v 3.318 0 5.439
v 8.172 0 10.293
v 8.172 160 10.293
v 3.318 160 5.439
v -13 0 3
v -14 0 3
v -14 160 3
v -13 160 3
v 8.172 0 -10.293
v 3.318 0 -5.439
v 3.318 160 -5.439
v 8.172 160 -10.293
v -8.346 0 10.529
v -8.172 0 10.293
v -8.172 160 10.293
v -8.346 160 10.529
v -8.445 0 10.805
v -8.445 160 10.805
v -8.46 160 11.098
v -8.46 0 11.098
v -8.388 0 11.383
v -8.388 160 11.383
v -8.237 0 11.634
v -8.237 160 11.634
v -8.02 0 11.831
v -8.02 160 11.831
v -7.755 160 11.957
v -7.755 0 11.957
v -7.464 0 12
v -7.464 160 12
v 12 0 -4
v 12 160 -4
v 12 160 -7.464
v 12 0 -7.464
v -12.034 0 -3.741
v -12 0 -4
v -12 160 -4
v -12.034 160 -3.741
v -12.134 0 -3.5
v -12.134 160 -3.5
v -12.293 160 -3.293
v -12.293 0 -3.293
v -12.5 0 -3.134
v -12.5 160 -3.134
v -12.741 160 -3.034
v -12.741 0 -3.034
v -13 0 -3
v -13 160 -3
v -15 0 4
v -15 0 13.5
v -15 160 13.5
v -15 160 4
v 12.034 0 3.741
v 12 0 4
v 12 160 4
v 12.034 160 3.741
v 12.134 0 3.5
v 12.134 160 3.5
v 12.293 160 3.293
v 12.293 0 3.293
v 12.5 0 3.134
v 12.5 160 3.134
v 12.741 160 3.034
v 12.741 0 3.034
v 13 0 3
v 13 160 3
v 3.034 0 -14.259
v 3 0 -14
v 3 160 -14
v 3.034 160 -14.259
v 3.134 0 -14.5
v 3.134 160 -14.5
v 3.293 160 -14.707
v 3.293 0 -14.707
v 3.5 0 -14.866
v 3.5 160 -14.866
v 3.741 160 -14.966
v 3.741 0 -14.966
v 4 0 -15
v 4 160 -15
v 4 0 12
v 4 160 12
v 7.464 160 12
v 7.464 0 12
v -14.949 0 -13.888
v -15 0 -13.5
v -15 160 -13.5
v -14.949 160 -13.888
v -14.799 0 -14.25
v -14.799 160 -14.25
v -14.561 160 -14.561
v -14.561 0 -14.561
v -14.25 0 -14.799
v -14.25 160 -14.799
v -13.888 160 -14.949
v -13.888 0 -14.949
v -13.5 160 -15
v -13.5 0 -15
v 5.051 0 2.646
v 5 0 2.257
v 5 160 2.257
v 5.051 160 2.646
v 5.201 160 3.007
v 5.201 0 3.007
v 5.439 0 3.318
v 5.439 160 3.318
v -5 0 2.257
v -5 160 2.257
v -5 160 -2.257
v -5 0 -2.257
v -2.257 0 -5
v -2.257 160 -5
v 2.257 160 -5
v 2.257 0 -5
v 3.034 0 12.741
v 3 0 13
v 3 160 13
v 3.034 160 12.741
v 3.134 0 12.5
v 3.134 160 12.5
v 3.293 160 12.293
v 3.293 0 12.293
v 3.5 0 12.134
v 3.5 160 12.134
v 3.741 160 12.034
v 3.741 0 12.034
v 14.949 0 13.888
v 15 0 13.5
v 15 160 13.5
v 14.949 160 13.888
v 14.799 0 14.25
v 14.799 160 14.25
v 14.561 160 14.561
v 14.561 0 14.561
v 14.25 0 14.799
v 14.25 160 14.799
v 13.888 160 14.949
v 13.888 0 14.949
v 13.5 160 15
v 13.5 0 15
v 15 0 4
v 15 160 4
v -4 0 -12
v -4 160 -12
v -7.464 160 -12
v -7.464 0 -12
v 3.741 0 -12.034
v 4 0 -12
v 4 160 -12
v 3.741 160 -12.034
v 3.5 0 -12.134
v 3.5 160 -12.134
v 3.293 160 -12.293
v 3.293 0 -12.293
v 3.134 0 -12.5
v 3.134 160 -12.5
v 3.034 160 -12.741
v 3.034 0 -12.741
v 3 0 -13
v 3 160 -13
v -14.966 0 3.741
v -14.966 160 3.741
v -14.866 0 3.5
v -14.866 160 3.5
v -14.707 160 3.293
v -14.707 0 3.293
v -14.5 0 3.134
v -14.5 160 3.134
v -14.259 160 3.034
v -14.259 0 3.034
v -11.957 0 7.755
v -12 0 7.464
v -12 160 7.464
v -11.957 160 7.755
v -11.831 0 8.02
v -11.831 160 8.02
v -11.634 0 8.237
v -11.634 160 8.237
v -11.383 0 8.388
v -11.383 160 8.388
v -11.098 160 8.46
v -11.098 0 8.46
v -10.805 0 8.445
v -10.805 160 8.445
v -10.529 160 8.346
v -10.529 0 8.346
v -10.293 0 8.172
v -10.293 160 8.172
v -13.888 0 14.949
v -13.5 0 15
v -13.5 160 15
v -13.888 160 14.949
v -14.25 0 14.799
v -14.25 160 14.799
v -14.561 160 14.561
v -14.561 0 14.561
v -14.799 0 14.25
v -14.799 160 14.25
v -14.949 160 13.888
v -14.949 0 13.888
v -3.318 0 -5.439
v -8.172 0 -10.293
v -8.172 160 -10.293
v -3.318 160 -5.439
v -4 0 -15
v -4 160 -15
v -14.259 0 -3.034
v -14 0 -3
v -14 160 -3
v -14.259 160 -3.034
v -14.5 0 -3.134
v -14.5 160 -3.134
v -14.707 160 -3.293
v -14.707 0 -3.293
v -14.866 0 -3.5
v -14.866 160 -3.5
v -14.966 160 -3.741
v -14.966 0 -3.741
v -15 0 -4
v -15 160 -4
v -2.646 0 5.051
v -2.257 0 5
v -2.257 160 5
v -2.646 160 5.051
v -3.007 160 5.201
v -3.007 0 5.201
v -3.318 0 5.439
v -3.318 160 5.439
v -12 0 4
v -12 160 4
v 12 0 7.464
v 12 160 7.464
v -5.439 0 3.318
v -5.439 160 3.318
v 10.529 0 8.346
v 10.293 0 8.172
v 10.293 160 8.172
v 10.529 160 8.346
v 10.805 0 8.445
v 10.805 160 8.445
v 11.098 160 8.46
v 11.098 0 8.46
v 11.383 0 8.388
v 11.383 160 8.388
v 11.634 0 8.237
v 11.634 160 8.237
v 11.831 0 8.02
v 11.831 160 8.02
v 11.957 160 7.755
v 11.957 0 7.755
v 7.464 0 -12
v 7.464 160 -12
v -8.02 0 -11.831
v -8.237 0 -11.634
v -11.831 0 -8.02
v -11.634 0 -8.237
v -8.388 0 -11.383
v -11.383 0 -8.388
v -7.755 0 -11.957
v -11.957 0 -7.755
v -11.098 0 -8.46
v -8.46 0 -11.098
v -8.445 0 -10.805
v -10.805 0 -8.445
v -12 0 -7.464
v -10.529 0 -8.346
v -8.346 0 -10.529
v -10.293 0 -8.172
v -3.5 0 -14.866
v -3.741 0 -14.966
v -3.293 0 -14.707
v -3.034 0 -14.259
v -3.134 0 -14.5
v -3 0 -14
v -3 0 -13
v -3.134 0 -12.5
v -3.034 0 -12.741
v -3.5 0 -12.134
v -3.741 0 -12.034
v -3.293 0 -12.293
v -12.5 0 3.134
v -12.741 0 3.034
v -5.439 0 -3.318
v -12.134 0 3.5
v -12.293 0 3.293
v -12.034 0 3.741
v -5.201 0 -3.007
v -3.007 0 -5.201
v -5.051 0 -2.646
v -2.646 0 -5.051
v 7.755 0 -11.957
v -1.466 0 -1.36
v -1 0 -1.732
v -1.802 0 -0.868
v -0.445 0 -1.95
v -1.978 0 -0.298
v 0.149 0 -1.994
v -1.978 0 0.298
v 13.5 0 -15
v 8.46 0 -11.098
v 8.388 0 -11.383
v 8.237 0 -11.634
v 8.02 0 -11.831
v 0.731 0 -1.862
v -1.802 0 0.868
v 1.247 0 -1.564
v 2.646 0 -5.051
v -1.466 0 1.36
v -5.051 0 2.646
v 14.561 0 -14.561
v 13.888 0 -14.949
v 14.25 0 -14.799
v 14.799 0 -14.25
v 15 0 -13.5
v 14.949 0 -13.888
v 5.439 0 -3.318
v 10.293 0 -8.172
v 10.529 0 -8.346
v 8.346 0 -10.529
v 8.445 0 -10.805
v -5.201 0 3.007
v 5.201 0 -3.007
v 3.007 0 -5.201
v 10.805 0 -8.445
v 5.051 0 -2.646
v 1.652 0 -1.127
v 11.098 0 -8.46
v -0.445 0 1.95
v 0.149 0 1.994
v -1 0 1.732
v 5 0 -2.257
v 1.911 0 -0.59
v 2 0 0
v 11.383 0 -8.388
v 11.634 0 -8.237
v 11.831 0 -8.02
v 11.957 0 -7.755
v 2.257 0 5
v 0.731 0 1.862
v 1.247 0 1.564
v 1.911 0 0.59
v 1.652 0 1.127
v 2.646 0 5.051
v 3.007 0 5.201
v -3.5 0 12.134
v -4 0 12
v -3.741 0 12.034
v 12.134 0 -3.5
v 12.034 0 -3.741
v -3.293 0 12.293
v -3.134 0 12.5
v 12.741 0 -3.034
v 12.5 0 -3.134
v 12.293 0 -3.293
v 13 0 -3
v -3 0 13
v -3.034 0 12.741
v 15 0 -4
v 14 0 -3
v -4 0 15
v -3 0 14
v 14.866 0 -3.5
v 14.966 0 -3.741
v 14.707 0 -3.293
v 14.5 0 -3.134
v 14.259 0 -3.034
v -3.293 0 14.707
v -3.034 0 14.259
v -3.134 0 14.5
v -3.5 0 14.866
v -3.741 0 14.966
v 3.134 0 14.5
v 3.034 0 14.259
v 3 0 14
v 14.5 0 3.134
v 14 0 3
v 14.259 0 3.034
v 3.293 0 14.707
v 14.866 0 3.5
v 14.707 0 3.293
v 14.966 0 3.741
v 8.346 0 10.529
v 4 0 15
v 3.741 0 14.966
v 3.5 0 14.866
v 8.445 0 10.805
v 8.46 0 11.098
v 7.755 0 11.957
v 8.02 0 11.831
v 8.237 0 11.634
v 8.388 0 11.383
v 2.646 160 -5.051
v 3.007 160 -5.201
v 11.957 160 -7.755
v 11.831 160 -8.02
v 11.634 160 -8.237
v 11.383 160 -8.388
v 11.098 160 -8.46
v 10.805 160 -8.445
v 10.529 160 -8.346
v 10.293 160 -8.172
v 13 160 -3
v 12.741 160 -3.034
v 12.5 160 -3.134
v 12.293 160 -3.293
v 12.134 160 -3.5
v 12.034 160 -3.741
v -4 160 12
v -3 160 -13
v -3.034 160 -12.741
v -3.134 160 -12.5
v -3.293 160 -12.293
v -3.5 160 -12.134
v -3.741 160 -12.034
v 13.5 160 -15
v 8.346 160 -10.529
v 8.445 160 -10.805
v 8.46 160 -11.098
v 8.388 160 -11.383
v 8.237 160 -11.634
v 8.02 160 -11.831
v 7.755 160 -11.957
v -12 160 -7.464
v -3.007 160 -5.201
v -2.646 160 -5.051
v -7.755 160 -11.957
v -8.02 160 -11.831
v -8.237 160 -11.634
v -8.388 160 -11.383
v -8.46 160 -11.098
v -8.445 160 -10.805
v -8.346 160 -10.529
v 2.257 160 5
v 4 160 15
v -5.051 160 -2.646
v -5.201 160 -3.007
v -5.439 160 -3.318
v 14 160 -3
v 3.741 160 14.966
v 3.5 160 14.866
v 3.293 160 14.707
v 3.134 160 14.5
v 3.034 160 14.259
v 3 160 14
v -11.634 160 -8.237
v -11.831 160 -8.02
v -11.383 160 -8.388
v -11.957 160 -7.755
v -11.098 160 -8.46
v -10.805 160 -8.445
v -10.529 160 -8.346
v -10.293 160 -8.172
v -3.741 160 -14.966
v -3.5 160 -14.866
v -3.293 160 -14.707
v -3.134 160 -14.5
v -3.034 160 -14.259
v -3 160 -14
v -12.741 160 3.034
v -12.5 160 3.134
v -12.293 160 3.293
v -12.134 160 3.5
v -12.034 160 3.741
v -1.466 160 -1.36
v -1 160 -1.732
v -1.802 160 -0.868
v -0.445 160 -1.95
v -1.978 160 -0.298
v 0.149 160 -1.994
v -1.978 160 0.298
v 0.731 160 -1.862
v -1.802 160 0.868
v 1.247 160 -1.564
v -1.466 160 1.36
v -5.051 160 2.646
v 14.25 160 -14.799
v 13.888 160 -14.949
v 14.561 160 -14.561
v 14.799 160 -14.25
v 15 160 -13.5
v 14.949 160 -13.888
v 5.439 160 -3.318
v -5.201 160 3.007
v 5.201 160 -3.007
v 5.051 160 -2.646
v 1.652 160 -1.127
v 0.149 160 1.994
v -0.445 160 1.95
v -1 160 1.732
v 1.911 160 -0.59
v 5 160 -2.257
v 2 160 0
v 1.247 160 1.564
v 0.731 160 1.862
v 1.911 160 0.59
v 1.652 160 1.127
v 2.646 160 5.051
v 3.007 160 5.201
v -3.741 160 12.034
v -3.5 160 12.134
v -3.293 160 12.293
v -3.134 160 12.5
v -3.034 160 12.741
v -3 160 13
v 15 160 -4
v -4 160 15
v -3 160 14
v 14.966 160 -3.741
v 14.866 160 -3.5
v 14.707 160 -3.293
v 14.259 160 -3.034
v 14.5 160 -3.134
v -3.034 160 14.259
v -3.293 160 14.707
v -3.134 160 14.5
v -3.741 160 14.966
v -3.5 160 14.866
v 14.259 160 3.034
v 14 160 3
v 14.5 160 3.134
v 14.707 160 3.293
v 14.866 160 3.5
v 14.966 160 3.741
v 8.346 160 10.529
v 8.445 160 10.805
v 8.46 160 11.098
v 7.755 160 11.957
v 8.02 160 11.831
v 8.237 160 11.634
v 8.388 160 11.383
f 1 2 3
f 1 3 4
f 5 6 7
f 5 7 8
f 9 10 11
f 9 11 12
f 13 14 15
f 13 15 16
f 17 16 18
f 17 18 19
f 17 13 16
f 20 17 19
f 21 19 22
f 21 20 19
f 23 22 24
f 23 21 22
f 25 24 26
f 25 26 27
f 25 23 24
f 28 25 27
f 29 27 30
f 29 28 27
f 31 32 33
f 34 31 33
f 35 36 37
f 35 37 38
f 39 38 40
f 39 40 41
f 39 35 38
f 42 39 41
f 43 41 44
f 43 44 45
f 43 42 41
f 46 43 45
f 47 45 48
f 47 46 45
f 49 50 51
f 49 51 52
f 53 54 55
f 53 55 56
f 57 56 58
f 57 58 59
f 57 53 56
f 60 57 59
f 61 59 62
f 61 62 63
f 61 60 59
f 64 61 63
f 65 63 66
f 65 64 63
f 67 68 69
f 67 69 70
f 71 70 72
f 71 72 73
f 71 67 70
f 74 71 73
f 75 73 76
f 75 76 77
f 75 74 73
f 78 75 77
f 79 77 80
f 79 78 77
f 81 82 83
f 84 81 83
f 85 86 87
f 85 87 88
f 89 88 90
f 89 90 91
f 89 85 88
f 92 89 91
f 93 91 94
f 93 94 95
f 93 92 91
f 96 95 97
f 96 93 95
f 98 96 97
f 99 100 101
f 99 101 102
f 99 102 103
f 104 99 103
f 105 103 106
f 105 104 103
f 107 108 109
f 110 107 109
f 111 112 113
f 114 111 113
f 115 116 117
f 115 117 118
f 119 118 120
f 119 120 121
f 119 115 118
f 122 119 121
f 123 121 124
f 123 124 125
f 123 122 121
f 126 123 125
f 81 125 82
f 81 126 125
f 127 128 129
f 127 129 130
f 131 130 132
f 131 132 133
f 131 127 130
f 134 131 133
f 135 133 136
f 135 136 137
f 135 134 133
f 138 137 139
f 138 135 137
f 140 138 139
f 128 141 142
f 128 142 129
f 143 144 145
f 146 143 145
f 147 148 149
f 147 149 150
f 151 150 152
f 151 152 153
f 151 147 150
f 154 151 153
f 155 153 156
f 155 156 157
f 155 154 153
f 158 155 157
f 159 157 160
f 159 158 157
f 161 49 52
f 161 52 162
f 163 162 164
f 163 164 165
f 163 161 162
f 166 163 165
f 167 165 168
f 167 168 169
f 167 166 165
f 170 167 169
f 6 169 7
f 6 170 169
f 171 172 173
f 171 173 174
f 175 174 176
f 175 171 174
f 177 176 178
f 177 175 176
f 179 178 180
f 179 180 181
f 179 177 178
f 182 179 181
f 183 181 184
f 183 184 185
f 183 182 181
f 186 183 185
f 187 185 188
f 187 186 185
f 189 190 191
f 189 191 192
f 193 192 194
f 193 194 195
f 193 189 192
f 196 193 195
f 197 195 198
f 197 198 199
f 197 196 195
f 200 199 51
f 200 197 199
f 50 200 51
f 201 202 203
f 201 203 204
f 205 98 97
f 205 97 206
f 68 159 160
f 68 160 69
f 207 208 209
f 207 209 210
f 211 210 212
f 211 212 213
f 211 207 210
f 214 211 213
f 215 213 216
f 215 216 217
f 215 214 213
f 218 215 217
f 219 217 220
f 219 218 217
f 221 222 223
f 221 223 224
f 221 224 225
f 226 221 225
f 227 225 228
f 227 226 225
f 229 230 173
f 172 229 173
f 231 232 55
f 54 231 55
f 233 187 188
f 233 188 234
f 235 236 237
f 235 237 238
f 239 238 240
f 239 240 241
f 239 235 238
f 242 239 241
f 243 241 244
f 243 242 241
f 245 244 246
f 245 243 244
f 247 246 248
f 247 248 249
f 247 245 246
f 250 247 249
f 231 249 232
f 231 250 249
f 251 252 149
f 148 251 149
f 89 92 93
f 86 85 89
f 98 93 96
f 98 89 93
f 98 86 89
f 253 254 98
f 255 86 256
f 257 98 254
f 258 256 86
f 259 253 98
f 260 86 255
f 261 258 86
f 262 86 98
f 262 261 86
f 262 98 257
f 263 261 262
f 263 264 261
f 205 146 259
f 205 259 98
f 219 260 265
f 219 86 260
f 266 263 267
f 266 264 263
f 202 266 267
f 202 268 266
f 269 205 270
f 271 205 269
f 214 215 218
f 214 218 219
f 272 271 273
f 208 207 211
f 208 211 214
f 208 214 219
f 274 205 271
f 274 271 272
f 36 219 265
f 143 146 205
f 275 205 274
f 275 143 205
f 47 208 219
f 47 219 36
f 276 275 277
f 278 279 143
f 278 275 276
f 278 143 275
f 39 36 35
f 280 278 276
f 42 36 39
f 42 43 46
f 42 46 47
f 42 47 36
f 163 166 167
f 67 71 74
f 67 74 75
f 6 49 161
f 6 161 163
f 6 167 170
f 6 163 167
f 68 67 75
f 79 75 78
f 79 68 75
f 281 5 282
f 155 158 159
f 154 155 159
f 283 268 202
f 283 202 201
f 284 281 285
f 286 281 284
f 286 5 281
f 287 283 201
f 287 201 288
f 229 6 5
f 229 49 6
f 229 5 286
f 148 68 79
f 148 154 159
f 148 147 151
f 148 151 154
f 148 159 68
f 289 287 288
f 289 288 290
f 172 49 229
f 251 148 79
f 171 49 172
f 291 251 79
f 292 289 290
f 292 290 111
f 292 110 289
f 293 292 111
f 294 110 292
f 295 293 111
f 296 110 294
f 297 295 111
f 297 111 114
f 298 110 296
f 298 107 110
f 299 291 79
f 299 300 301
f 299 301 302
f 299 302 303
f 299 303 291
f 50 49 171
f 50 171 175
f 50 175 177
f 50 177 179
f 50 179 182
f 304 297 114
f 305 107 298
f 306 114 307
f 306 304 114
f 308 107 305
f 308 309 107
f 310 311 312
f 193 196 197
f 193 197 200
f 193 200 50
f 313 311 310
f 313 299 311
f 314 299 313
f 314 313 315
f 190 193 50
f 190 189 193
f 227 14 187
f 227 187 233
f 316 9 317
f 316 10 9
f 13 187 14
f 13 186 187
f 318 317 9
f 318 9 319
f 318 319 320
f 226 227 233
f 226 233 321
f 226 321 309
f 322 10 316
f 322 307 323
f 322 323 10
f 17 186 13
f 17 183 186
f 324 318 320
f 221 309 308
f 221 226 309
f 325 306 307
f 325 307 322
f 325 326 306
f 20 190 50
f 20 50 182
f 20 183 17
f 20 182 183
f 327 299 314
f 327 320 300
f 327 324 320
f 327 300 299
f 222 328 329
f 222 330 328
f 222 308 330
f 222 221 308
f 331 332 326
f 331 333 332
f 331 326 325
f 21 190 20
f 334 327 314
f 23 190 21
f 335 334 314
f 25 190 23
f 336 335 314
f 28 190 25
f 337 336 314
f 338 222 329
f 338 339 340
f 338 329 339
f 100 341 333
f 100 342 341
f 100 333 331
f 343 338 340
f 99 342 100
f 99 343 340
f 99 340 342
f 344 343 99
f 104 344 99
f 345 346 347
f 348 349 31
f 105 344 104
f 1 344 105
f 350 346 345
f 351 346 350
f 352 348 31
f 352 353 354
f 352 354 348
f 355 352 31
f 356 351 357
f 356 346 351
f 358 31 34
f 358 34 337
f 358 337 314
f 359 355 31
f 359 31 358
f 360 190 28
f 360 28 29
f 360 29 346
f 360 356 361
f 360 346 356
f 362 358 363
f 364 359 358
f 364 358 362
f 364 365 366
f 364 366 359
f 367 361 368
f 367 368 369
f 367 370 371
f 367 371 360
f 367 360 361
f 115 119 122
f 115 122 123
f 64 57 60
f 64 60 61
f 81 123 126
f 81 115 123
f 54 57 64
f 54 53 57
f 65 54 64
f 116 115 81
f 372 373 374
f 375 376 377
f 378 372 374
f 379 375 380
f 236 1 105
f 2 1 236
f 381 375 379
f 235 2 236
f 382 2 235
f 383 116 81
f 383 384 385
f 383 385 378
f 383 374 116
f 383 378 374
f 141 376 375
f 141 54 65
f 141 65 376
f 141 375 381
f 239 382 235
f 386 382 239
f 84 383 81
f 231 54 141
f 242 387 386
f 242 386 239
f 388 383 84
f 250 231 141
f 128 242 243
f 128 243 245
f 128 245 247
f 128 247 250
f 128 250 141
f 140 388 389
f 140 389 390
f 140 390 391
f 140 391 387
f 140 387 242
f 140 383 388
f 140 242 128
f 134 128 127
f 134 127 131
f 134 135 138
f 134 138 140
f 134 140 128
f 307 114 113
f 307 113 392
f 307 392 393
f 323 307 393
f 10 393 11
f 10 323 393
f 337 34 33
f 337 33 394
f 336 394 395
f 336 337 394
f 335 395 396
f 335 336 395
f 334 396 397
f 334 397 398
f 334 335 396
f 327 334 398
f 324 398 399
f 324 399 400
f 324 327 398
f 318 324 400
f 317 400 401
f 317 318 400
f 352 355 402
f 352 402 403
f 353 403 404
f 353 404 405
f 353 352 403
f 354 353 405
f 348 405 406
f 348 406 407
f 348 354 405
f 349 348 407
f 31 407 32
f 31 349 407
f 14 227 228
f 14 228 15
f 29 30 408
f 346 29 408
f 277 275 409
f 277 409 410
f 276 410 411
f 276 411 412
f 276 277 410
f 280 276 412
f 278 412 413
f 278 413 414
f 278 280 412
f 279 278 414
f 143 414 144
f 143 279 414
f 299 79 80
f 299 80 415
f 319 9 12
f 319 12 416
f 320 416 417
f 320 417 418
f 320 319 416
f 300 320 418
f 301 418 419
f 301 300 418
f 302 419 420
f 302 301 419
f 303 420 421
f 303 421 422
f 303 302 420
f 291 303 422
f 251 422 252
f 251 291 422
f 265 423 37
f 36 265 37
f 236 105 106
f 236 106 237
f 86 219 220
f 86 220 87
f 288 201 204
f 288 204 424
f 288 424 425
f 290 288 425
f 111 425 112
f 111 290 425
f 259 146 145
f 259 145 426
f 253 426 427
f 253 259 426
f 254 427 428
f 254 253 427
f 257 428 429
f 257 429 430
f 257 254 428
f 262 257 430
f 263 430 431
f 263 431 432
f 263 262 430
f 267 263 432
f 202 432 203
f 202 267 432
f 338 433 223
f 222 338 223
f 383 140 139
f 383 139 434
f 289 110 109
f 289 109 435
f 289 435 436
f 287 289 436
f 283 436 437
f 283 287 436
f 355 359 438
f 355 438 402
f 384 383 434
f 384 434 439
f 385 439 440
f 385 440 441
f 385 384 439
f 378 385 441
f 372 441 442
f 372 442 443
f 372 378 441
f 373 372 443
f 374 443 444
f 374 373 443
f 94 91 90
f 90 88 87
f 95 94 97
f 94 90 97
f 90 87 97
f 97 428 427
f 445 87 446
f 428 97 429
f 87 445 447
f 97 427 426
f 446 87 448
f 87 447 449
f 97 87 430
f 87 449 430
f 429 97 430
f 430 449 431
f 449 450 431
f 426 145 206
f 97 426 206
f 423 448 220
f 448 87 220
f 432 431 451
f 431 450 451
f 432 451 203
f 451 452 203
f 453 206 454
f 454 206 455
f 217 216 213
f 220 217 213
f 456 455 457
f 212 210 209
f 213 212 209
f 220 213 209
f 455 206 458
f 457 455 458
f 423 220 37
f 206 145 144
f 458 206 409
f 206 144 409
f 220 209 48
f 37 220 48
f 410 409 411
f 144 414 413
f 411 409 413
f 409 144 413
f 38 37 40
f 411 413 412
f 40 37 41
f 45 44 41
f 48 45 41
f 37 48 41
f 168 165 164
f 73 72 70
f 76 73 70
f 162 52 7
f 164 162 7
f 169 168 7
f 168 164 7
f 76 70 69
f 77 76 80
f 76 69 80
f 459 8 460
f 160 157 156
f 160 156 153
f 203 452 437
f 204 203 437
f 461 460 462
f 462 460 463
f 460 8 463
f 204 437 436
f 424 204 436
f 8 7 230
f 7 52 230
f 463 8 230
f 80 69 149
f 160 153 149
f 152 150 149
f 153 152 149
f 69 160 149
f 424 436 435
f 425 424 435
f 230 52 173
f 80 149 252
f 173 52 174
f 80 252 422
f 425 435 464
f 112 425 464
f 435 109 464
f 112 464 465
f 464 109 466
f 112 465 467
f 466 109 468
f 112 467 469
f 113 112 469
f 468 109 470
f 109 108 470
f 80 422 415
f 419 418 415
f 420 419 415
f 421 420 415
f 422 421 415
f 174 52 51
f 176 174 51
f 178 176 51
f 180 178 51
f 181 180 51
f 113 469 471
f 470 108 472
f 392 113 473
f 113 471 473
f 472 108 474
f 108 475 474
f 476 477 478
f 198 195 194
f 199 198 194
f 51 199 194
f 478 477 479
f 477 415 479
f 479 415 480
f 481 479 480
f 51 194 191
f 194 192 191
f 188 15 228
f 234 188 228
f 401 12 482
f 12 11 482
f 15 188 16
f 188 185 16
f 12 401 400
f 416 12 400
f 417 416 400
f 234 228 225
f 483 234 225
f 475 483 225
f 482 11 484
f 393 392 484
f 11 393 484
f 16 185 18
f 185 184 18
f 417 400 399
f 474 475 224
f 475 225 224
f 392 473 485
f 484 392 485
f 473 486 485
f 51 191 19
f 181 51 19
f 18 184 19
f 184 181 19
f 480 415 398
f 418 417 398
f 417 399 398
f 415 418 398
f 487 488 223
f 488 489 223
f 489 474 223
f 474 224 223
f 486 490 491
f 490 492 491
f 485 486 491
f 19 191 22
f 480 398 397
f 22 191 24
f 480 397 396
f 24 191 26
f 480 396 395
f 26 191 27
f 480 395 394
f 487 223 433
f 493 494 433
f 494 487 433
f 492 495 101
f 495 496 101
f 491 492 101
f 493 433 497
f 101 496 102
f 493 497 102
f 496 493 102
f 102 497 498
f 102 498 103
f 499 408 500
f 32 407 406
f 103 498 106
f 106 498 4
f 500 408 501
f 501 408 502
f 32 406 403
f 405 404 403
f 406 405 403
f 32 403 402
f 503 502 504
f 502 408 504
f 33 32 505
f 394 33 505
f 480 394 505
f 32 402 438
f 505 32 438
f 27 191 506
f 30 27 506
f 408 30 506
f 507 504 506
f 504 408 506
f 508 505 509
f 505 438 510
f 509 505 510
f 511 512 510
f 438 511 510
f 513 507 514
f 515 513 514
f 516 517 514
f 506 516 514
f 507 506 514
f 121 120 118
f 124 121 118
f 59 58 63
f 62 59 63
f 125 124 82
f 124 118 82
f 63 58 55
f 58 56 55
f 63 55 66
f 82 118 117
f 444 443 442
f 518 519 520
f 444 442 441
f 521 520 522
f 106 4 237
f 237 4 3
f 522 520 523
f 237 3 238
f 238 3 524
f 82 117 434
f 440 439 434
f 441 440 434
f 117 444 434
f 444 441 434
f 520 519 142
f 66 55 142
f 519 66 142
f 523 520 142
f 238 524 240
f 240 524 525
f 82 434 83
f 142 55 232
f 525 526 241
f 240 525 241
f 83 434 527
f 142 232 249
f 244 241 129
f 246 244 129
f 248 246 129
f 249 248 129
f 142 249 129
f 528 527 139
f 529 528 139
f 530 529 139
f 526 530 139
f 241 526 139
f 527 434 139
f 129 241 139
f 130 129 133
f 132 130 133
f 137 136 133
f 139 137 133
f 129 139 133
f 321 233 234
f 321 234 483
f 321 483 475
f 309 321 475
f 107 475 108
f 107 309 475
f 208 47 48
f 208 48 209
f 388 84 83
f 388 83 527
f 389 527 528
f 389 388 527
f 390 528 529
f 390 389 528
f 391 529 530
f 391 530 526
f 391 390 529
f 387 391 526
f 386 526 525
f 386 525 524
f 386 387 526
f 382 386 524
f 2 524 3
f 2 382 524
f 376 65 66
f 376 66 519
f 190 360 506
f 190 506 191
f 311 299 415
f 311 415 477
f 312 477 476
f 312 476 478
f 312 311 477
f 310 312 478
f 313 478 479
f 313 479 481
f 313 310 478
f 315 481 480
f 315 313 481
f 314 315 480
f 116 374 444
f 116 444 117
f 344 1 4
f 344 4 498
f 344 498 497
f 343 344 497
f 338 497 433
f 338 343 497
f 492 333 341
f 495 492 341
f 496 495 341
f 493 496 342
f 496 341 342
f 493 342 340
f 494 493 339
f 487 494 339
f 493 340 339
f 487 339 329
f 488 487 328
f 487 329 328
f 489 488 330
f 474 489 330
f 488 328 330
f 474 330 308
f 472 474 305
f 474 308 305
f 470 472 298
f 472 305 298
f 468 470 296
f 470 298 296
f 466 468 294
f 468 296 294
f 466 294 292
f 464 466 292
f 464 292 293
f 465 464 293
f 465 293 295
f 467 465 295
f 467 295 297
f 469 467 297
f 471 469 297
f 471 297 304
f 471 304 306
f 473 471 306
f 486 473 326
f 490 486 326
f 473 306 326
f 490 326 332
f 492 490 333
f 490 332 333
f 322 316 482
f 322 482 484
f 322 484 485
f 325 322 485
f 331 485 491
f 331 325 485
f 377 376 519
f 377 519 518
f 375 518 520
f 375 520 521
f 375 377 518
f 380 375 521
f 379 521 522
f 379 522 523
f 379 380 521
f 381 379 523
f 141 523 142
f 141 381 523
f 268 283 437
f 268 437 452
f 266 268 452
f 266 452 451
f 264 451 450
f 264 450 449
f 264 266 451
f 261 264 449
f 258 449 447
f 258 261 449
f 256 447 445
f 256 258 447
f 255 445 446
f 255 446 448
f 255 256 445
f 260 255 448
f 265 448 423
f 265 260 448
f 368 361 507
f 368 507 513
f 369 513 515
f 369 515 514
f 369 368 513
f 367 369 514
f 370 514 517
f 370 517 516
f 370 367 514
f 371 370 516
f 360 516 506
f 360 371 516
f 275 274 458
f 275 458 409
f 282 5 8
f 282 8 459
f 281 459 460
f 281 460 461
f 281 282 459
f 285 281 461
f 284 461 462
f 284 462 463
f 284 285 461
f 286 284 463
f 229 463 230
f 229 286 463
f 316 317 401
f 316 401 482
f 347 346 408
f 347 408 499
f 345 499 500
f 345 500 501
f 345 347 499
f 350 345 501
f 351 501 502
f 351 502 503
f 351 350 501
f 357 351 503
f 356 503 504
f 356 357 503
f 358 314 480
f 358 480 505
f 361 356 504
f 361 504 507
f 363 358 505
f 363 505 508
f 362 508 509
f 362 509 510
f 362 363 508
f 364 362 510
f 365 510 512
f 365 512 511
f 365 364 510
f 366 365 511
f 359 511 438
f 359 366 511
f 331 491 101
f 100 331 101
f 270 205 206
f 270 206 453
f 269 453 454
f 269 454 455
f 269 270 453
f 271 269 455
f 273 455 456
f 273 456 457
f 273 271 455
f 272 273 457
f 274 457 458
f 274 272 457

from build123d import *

# Parameters (mm, degrees)
F0_R     = 2
F1_DEPTH = 160


with BuildPart() as f1:
    # F0 (on Front) → F1 (new body)
    with BuildSketch(Plane.XZ):
        with BuildLine():
            ThreePointArc((15, 13.5), (14.56066, 14.56066), (13.5, 15))
            Line((13.5, 15), (4, 15))
            ThreePointArc((4, 15), (3.292893, 14.707107), (3, 14))
            Line((3, 14), (3, 13))
            ThreePointArc((3, 13), (3.292893, 12.292893), (4, 12))
            Line((4, 12), (7.464466, 12))
            ThreePointArc((7.464466, 12), (8.388346, 11.382683), (8.171573, 10.292893))
            Line((8.171573, 10.292893), (3.318019, 5.43934))
            ThreePointArc((3.318019, 5.43934), (2.831384, 5.114181), (2.257359, 5))
            Line((2.257359, 5), (-2.257359, 5))
            ThreePointArc((-2.257359, 5), (-2.831384, 5.114181), (-3.318019, 5.43934))
            Line((-3.318019, 5.43934), (-8.171573, 10.292893))
            ThreePointArc((-8.171573, 10.292893), (-8.388346, 11.382683), (-7.464466, 12))
            Line((-7.464466, 12), (-4, 12))
            ThreePointArc((-4, 12), (-3.292893, 12.292893), (-3, 13))
            Line((-3, 13), (-3, 14))
            ThreePointArc((-3, 14), (-3.292893, 14.707107), (-4, 15))
            Line((-4, 15), (-13.5, 15))
            ThreePointArc((-13.5, 15), (-14.56066, 14.56066), (-15, 13.5))
            Line((-15, 13.5), (-15, 4))
            ThreePointArc((-15, 4), (-14.707107, 3.292893), (-14, 3))
            Line((-14, 3), (-13, 3))
            ThreePointArc((-13, 3), (-12.292893, 3.292893), (-12, 4))
            Line((-12, 4), (-12, 7.464466))
            ThreePointArc((-12, 7.464466), (-11.382683, 8.388346), (-10.292893, 8.171573))
            Line((-10.292893, 8.171573), (-5.43934, 3.318019))
            ThreePointArc((-5.43934, 3.318019), (-5.114181, 2.831384), (-5, 2.257359))
            Line((-5, 2.257359), (-5, -2.257359))
            ThreePointArc((-5, -2.257359), (-5.114181, -2.831384), (-5.43934, -3.318019))
            Line((-5.43934, -3.318019), (-10.292893, -8.171573))
            ThreePointArc((-10.292893, -8.171573), (-11.382683, -8.388346), (-12, -7.464466))
            Line((-12, -7.464466), (-12, -4))
            ThreePointArc((-12, -4), (-12.292893, -3.292893), (-13, -3))
            Line((-13, -3), (-14, -3))
            ThreePointArc((-14, -3), (-14.707107, -3.292893), (-15, -4))
            Line((-15, -4), (-15, -13.5))
            ThreePointArc((-15, -13.5), (-14.56066, -14.56066), (-13.5, -15))
            Line((-13.5, -15), (-4, -15))
            ThreePointArc((-4, -15), (-3.292893, -14.707107), (-3, -14))
            Line((-3, -14), (-3, -13))
            ThreePointArc((-3, -13), (-3.292893, -12.292893), (-4, -12))
            Line((-4, -12), (-7.464466, -12))
            ThreePointArc((-7.464466, -12), (-8.388346, -11.382683), (-8.171573, -10.292893))
            Line((-8.171573, -10.292893), (-3.318019, -5.43934))
            ThreePointArc((-3.318019, -5.43934), (-2.831384, -5.114181), (-2.257359, -5))
            Line((-2.257359, -5), (2.257359, -5))
            ThreePointArc((2.257359, -5), (2.831384, -5.114181), (3.318019, -5.43934))
            Line((3.318019, -5.43934), (8.171573, -10.292893))
            ThreePointArc((8.171573, -10.292893), (8.388346, -11.382683), (7.464466, -12))
            Line((7.464466, -12), (4, -12))
            ThreePointArc((4, -12), (3.292893, -12.292893), (3, -13))
            Line((3, -13), (3, -14))
            ThreePointArc((3, -14), (3.292893, -14.707107), (4, -15))
            Line((4, -15), (13.5, -15))
            ThreePointArc((13.5, -15), (14.56066, -14.56066), (15, -13.5))
            Line((15, -13.5), (15, -4))
            ThreePointArc((15, -4), (14.707107, -3.292893), (14, -3))
            Line((14, -3), (13, -3))
            ThreePointArc((13, -3), (12.292893, -3.292893), (12, -4))
            Line((12, -4), (12, -7.464466))
            ThreePointArc((12, -7.464466), (11.382683, -8.388346), (10.292893, -8.171573))
            Line((10.292893, -8.171573), (5.43934, -3.318019))
            ThreePointArc((5.43934, -3.318019), (5.114181, -2.831384), (5, -2.257359))
            Line((5, -2.257359), (5, 2.257359))
            ThreePointArc((5, 2.257359), (5.114181, 2.831384), (5.43934, 3.318019))
            Line((5.43934, 3.318019), (10.292893, 8.171573))
            ThreePointArc((10.292893, 8.171573), (11.382683, 8.388346), (12, 7.464466))
            Line((12, 7.464466), (12, 4))
            ThreePointArc((12, 4), (12.292893, 3.292893), (13, 3))
            Line((13, 3), (14, 3))
            ThreePointArc((14, 3), (14.707107, 3.292893), (15, 4))
            Line((15, 4), (15, 13.5))
        make_face()
        Circle(F0_R, mode=Mode.SUBTRACT)
    extrude(amount=-F1_DEPTH)


solid = f1.part
